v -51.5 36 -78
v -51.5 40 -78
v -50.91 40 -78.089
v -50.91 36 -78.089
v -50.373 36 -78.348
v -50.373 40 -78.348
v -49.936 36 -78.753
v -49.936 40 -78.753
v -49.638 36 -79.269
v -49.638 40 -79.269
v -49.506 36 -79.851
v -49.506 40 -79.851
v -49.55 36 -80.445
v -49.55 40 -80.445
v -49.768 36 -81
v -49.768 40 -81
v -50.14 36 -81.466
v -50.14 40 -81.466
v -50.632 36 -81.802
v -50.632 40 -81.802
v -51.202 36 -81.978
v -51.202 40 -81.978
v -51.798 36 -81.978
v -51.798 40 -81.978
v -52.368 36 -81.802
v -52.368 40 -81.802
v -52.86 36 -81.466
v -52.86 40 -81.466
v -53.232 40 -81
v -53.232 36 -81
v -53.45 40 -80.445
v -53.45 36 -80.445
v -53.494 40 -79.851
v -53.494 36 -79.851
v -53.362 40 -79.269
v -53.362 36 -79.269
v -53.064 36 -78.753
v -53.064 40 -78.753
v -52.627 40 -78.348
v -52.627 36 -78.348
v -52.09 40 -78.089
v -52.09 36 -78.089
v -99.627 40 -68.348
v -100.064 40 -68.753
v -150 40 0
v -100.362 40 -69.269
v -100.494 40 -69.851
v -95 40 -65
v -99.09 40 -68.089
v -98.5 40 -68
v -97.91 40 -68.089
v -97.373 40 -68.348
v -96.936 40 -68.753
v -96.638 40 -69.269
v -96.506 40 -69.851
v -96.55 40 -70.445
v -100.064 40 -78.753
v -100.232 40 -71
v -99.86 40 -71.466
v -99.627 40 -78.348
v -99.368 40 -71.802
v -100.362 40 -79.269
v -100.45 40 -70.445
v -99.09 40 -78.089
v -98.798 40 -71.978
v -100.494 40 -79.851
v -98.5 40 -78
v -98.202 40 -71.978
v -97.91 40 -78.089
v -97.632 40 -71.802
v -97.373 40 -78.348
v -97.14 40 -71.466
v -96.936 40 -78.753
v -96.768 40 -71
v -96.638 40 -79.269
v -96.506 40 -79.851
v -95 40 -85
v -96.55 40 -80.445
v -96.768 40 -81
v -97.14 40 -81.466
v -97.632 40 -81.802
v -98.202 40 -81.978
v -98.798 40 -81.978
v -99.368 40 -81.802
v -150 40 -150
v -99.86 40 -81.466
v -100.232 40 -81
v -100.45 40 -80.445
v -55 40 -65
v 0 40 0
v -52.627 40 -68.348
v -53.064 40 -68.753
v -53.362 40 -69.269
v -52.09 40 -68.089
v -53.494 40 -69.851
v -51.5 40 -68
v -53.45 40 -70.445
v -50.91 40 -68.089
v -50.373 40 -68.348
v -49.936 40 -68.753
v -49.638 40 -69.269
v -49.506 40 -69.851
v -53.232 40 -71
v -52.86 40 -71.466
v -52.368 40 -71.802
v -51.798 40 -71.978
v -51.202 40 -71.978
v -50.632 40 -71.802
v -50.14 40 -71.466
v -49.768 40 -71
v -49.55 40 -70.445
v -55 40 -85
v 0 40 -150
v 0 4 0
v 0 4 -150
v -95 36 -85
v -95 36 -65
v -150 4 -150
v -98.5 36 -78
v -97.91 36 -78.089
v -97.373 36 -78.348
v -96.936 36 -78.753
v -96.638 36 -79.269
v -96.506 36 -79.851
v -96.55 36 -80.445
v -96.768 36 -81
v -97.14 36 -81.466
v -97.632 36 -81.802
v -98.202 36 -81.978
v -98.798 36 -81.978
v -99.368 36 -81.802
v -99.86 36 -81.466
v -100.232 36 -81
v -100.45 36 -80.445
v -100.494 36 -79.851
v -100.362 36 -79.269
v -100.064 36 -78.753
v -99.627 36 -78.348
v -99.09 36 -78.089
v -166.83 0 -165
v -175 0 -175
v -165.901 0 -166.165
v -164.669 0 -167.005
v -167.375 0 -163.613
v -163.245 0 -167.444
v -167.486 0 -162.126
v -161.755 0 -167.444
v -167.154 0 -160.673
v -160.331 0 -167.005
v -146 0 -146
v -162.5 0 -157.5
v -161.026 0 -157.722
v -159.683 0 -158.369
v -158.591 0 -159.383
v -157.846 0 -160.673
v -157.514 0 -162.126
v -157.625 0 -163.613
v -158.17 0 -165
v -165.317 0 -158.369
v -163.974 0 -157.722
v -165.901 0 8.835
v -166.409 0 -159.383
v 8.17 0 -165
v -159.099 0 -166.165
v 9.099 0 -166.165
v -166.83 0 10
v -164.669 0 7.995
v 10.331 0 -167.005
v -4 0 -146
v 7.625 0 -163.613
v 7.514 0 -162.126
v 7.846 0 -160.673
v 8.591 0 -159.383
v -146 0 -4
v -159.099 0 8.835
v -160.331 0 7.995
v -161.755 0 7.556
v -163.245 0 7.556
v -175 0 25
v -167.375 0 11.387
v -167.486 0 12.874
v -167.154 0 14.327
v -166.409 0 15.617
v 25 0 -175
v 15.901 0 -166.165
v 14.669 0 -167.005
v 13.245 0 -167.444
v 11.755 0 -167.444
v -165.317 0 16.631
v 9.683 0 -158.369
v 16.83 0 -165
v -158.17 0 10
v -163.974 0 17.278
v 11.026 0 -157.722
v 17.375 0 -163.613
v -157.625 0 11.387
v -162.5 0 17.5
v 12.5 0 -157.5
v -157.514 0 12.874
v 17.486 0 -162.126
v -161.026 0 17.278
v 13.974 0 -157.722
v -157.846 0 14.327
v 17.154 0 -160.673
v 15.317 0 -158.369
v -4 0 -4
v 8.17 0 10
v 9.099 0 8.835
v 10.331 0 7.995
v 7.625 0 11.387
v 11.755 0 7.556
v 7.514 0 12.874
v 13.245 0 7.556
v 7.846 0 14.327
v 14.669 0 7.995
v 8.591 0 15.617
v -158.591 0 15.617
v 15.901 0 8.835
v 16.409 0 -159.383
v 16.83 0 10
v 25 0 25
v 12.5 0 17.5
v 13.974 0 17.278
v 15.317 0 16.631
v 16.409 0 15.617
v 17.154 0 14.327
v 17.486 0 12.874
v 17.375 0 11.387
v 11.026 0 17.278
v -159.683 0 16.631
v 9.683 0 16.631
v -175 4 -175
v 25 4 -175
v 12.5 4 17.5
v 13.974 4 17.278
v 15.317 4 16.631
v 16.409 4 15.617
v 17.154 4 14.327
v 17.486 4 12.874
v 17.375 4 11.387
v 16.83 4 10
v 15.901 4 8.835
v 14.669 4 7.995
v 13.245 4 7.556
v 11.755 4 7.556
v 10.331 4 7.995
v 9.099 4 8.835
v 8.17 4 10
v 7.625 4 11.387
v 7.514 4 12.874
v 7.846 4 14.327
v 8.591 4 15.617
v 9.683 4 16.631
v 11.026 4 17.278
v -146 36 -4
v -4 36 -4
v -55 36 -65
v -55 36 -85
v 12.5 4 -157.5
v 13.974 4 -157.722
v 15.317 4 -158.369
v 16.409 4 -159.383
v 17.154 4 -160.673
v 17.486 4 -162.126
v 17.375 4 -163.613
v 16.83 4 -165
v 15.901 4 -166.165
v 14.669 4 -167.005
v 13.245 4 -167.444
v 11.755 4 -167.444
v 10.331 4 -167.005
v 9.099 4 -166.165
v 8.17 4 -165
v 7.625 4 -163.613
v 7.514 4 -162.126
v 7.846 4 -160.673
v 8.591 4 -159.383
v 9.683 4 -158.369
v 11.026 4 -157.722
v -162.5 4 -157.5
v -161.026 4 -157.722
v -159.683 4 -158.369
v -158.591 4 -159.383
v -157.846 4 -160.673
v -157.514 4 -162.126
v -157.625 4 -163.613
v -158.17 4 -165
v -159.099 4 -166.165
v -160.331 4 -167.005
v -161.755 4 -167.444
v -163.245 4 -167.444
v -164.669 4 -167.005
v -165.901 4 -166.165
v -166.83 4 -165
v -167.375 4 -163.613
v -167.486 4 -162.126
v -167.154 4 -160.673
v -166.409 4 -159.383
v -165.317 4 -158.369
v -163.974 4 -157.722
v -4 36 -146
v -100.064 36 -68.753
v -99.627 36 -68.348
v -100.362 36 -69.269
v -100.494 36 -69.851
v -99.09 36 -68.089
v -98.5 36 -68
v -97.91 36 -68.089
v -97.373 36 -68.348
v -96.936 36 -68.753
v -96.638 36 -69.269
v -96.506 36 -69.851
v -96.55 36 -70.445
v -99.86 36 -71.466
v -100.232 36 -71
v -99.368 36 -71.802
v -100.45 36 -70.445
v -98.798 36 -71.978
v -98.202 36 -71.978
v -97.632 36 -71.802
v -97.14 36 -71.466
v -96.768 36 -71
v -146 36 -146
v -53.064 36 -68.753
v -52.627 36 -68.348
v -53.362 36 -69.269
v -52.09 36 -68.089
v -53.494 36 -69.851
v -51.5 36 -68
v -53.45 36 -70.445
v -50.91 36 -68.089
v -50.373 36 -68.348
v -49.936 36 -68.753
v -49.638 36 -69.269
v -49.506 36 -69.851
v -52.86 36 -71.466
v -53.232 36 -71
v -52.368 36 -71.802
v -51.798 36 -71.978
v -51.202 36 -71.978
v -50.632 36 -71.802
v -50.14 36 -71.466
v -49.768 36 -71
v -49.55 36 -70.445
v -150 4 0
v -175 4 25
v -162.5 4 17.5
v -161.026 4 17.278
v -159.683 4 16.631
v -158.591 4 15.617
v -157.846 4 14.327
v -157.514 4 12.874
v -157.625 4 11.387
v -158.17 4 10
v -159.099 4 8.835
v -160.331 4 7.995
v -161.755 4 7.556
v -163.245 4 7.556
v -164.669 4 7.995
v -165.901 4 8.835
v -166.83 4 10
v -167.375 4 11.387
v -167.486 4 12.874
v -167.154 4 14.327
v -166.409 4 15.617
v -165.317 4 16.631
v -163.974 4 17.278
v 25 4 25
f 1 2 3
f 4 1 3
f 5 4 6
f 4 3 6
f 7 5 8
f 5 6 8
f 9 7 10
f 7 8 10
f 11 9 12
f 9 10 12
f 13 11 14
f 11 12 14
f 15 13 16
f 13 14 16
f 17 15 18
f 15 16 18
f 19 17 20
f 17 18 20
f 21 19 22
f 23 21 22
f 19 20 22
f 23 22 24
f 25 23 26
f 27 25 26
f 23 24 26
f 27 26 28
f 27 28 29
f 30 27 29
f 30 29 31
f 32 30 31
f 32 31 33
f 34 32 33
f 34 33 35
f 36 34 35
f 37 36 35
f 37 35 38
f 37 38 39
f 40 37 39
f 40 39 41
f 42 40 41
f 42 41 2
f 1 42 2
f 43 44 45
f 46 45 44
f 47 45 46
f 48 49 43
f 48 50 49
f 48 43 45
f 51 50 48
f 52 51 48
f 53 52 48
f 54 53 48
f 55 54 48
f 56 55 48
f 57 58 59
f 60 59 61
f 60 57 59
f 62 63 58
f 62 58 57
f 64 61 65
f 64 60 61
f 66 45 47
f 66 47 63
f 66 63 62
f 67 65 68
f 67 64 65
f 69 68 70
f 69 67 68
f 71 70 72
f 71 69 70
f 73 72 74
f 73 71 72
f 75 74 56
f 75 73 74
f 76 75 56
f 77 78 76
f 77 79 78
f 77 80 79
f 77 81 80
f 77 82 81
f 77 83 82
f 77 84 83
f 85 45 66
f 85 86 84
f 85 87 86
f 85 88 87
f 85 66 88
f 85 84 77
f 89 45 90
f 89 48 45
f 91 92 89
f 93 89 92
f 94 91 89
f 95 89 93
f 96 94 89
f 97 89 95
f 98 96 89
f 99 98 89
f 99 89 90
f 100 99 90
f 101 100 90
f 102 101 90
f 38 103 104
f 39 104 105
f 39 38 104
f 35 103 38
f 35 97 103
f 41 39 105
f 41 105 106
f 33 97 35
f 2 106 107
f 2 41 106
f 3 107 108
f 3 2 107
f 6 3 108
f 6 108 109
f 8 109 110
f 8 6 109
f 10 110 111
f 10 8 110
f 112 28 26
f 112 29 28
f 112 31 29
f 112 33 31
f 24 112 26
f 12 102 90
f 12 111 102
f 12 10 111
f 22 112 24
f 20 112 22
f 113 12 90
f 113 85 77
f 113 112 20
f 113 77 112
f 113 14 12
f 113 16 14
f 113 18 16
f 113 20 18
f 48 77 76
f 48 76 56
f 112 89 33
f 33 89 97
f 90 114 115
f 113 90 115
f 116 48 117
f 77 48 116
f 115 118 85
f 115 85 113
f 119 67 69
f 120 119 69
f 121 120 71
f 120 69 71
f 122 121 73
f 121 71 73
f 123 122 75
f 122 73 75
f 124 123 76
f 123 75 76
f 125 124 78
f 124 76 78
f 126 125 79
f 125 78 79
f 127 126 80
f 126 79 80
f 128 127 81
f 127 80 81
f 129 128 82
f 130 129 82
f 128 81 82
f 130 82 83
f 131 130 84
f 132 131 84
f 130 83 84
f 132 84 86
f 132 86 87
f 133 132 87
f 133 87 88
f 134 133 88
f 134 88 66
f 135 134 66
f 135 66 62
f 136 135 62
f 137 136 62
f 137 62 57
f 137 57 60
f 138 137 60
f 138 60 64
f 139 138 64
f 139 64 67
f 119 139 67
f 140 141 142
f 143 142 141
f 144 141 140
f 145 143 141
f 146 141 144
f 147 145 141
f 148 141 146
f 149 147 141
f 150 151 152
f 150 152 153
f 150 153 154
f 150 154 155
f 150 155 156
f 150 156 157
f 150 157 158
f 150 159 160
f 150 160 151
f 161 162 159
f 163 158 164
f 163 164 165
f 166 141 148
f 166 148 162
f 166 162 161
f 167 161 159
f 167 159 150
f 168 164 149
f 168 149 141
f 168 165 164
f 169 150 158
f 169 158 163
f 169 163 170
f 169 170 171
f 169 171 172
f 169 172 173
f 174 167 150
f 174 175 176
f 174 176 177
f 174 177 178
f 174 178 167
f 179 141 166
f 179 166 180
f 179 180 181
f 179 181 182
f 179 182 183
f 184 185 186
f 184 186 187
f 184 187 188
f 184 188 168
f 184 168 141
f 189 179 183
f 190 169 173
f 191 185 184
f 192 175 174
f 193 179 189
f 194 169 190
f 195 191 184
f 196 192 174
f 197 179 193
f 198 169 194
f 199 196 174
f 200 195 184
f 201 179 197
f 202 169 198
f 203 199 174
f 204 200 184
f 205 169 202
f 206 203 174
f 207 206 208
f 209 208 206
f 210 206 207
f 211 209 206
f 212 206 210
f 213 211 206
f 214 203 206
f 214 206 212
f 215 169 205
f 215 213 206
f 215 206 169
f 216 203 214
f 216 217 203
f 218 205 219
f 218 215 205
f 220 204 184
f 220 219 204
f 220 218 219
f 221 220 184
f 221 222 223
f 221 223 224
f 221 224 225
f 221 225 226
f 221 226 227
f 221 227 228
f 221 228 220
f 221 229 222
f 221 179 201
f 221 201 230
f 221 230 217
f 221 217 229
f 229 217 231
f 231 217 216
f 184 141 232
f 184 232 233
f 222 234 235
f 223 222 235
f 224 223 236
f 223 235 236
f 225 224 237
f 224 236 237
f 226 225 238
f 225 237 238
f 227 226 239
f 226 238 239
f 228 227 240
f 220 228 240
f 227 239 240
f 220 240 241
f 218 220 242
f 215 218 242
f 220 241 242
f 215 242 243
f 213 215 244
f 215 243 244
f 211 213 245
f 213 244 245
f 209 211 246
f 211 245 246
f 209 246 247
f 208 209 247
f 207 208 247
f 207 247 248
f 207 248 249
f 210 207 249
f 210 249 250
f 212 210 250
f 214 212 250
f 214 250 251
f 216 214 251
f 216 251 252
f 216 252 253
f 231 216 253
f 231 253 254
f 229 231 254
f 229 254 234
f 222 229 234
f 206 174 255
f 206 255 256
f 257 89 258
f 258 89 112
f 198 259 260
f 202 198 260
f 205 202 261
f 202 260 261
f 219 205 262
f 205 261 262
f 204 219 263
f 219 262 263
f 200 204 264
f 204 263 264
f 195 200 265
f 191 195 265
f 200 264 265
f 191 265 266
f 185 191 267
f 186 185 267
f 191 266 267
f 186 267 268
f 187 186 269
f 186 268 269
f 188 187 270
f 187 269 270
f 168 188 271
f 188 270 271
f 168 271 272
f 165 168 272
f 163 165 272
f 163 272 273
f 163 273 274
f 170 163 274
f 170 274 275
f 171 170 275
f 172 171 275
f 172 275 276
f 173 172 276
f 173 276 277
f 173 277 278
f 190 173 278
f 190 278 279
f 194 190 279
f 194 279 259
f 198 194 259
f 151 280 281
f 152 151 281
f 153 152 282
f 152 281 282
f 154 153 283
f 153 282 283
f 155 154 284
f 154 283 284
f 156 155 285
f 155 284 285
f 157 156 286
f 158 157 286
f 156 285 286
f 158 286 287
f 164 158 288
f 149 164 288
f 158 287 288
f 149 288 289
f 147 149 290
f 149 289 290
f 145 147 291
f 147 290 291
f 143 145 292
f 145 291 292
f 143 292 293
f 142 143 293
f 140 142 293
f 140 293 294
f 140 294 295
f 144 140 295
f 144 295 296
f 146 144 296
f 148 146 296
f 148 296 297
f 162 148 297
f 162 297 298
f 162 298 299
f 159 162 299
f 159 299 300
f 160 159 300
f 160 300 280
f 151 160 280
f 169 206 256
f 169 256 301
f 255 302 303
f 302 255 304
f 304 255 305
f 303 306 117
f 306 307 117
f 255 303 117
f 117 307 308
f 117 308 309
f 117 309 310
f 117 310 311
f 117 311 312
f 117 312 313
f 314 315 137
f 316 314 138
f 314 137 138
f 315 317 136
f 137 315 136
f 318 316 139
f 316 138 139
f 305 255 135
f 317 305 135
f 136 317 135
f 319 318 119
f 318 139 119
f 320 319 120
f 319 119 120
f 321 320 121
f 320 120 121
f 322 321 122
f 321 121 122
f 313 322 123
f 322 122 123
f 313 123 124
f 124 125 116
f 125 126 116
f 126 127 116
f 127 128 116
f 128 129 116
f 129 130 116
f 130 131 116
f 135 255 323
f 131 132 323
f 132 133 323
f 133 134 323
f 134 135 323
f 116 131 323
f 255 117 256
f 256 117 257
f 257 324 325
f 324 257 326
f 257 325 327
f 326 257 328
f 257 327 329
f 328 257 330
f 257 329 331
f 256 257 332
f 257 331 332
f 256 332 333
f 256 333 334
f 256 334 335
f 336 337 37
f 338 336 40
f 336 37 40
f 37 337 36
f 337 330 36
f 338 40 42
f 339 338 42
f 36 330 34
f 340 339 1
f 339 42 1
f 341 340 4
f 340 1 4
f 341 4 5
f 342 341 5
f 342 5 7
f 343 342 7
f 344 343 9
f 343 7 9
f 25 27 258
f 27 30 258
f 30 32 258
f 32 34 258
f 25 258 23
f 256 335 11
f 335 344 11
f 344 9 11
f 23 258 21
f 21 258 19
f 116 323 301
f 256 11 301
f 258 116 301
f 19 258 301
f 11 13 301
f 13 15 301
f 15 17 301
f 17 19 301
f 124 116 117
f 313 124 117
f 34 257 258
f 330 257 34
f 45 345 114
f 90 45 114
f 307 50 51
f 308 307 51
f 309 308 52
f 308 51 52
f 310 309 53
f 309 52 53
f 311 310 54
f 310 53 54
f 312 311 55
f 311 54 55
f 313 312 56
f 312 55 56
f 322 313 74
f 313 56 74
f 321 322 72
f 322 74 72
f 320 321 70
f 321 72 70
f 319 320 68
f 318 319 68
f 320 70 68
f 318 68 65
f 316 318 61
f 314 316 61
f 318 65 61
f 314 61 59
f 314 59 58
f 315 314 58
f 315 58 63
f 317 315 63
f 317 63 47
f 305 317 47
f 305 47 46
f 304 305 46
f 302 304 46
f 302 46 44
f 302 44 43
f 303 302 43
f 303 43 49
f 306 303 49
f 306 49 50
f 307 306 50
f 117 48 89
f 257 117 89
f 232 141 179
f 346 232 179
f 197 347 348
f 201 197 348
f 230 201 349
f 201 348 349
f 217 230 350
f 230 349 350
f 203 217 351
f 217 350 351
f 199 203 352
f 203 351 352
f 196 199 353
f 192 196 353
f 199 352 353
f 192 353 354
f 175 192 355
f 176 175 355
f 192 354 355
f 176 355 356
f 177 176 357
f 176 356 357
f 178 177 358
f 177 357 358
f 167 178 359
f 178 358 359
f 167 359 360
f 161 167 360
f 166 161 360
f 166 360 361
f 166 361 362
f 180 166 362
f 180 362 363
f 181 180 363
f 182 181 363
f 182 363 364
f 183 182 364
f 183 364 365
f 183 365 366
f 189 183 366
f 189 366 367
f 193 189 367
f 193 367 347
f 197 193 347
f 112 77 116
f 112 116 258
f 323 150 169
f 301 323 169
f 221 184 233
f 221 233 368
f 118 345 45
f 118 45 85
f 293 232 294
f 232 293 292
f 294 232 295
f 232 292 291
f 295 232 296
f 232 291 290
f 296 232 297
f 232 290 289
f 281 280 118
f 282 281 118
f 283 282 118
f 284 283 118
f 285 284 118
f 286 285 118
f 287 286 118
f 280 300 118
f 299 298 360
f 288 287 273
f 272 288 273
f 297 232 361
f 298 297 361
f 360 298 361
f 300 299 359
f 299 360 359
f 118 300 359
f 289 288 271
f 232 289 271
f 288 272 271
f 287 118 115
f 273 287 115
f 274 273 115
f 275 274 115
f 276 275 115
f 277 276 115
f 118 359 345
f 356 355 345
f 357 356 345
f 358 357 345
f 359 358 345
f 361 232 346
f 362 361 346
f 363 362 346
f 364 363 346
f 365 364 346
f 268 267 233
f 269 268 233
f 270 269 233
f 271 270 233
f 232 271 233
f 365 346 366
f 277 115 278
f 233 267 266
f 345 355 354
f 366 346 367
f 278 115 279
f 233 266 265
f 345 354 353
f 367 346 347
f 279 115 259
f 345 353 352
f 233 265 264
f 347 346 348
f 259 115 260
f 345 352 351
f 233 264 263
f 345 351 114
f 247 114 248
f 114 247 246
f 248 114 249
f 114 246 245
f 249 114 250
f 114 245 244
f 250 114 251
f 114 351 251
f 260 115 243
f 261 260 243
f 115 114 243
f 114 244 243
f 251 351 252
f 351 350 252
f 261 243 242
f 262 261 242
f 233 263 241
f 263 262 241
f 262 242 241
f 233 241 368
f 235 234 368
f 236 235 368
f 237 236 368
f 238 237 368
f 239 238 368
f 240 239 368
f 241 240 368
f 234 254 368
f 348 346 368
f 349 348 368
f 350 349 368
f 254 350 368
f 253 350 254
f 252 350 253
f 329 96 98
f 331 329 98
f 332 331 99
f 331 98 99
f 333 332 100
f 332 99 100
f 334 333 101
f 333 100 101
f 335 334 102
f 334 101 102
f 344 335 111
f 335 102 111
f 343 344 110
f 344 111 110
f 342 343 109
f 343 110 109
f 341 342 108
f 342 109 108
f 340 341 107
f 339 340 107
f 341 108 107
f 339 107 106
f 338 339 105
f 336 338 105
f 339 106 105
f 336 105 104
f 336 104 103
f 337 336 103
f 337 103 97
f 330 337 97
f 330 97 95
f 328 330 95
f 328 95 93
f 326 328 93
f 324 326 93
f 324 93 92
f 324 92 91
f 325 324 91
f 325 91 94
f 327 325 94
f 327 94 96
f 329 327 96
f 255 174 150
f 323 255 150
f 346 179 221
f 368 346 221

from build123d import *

# Parameters (mm, degrees)
IZIM1_W                     = 150
IZIM1_H                     = 150
Y_KSEKLIK_EKSTR_ZYON1_DEPTH = 40
BO_ALTMA1_T                 = -4
IZIM2_W                     = 200
IZIM2_H                     = 200
IZIM2_W_2                   = 150
IZIM2_H_2                   = 150
Y_KSEKLIK_EKSTR_ZYON2_DEPTH = 4
KES_EKSTR_ZYON1_REACH       = 252.092
IZIM3_R                     = 5
KES_EKSTR_ZYON2_REACH       = 252.699
IZIM4_R                     = 2
IZIM4_W                     = 40
IZIM4_H                     = 20


with BuildPart() as part:
    # Çizim1 → Yükseklik-Ekstrüzyon1 (new body)
    with BuildSketch(Plane(origin=(0, 0, 0), x_dir=(1, 0, 0), z_dir=(0, 1, 0))):
        with Locations((-75, 75)):
            Rectangle(IZIM1_W, IZIM1_H)
    extrude(amount=Y_KSEKLIK_EKSTR_ZYON1_DEPTH)

    # İç Boşaltma1
    bo_altma1_openings = [part.faces().sort_by_distance(p)[0] for p in [
        (-75, 0, -75),
    ]]
    offset(amount=BO_ALTMA1_T, openings=bo_altma1_openings, kind=Kind.INTERSECTION)

    # Çizim2 → Yükseklik-Ekstrüzyon2 (add)
    with BuildSketch(Plane.XZ):
        with Locations((-75, -75)):
            Rectangle(IZIM2_W, IZIM2_H)
        with Locations((-75, -75)):
            Rectangle(IZIM2_W_2, IZIM2_H_2, mode=Mode.SUBTRACT)
    extrude(amount=-Y_KSEKLIK_EKSTR_ZYON2_DEPTH)

    # Çizim3 → Kes-Ekstrüzyon1 (cut, up to next)
    with BuildSketch(Plane(origin=(0, 4, 0), x_dir=(1, 0, 0), z_dir=(0, 1, 0)), mode=Mode.PRIVATE) as kes_ekstr_zyon1_sk1:
        with Locations(Location((12.5, 162.5, 0), (0, 0, 270))):
            Circle(IZIM3_R)
    kes_ekstr_zyon1_tool1 = extrude(kes_ekstr_zyon1_sk1.sketch, amount=-KES_EKSTR_ZYON1_REACH, mode=Mode.PRIVATE) & part.part
    # Çizim3 → Kes-Ekstrüzyon1 (cut, up to next)
    with BuildSketch(Plane(origin=(0, 4, 0), x_dir=(1, 0, 0), z_dir=(0, 1, 0)), mode=Mode.PRIVATE) as kes_ekstr_zyon1_sk2:
        with Locations(Location((12.5, -12.5, 0), (0, 0, 270))):
            Circle(IZIM3_R)
    kes_ekstr_zyon1_tool2 = extrude(kes_ekstr_zyon1_sk2.sketch, amount=-KES_EKSTR_ZYON1_REACH, mode=Mode.PRIVATE) & part.part
    # Çizim3 → Kes-Ekstrüzyon1 (cut, up to next)
    with BuildSketch(Plane(origin=(0, 4, 0), x_dir=(1, 0, 0), z_dir=(0, 1, 0)), mode=Mode.PRIVATE) as kes_ekstr_zyon1_sk3:
        with Locations(Location((-162.5, -12.5, 0), (0, 0, 270))):
            Circle(IZIM3_R)
    kes_ekstr_zyon1_tool3 = extrude(kes_ekstr_zyon1_sk3.sketch, amount=-KES_EKSTR_ZYON1_REACH, mode=Mode.PRIVATE) & part.part
    # Çizim3 → Kes-Ekstrüzyon1 (cut, up to next)
    with BuildSketch(Plane(origin=(0, 4, 0), x_dir=(1, 0, 0), z_dir=(0, 1, 0)), mode=Mode.PRIVATE) as kes_ekstr_zyon1_sk4:
        with Locations(Location((-162.5, 162.5, 0), (0, 0, 270))):
            Circle(IZIM3_R)
    kes_ekstr_zyon1_tool4 = extrude(kes_ekstr_zyon1_sk4.sketch, amount=-KES_EKSTR_ZYON1_REACH, mode=Mode.PRIVATE) & part.part
    add(kes_ekstr_zyon1_tool1.solids().sort_by_distance((12.5, 4, -162.5))[0], mode=Mode.SUBTRACT)
    add(kes_ekstr_zyon1_tool2.solids().sort_by_distance((12.5, 4, 12.5))[0], mode=Mode.SUBTRACT)
    add(kes_ekstr_zyon1_tool3.solids().sort_by_distance((-162.5, 4, 12.5))[0], mode=Mode.SUBTRACT)
    add(kes_ekstr_zyon1_tool4.solids().sort_by_distance((-162.5, 4, -162.5))[0], mode=Mode.SUBTRACT)

    # Çizim4 → Kes-Ekstrüzyon2 (cut, up to next)
    with BuildSketch(Plane(origin=(0, 40, 0), x_dir=(1, 0, 0), z_dir=(0, 1, 0)), mode=Mode.PRIVATE) as kes_ekstr_zyon2_sk1:
        with Locations(Location((-51.5, 70, 0), (0, 0, 270))):
            Circle(IZIM4_R)
    kes_ekstr_zyon2_tool1 = extrude(kes_ekstr_zyon2_sk1.sketch, amount=-KES_EKSTR_ZYON2_REACH, mode=Mode.PRIVATE) & part.part
    # Çizim4 → Kes-Ekstrüzyon2 (cut, up to next)
    with BuildSketch(Plane(origin=(0, 40, 0), x_dir=(1, 0, 0), z_dir=(0, 1, 0)), mode=Mode.PRIVATE) as kes_ekstr_zyon2_sk2:
        with Locations(Location((-51.5, 80, 0), (0, 0, 270))):
            Circle(IZIM4_R)
    kes_ekstr_zyon2_tool2 = extrude(kes_ekstr_zyon2_sk2.sketch, amount=-KES_EKSTR_ZYON2_REACH, mode=Mode.PRIVATE) & part.part
    # Çizim4 → Kes-Ekstrüzyon2 (cut, up to next)
    with BuildSketch(Plane(origin=(0, 40, 0), x_dir=(1, 0, 0), z_dir=(0, 1, 0)), mode=Mode.PRIVATE) as kes_ekstr_zyon2_sk3:
        with Locations(Location((-98.5, 80, 0), (0, 0, 270))):
            Circle(IZIM4_R)
    kes_ekstr_zyon2_tool3 = extrude(kes_ekstr_zyon2_sk3.sketch, amount=-KES_EKSTR_ZYON2_REACH, mode=Mode.PRIVATE) & part.part
    # Çizim4 → Kes-Ekstrüzyon2 (cut, up to next)
    with BuildSketch(Plane(origin=(0, 40, 0), x_dir=(1, 0, 0), z_dir=(0, 1, 0)), mode=Mode.PRIVATE) as kes_ekstr_zyon2_sk4:
        with Locations(Location((-98.5, 70, 0), (0, 0, 270))):
            Circle(IZIM4_R)
    kes_ekstr_zyon2_tool4 = extrude(kes_ekstr_zyon2_sk4.sketch, amount=-KES_EKSTR_ZYON2_REACH, mode=Mode.PRIVATE) & part.part
    # Çizim4 → Kes-Ekstrüzyon2 (cut, up to next)
    with BuildSketch(Plane(origin=(0, 40, 0), x_dir=(1, 0, 0), z_dir=(0, 1, 0)), mode=Mode.PRIVATE) as kes_ekstr_zyon2_sk5:
        with Locations((-75, 75)):
            Rectangle(IZIM4_W, IZIM4_H)
    kes_ekstr_zyon2_tool5 = extrude(kes_ekstr_zyon2_sk5.sketch, amount=-KES_EKSTR_ZYON2_REACH, mode=Mode.PRIVATE) & part.part
    add(kes_ekstr_zyon2_tool1.solids().sort_by_distance((-51.5, 40, -70))[0], mode=Mode.SUBTRACT)
    add(kes_ekstr_zyon2_tool2.solids().sort_by_distance((-51.5, 40, -80))[0], mode=Mode.SUBTRACT)
    add(kes_ekstr_zyon2_tool3.solids().sort_by_distance((-98.5, 40, -80))[0], mode=Mode.SUBTRACT)
    add(kes_ekstr_zyon2_tool4.solids().sort_by_distance((-98.5, 40, -70))[0], mode=Mode.SUBTRACT)
    add(kes_ekstr_zyon2_tool5.solids().sort_by_distance((-75, 40, -75))[0], mode=Mode.SUBTRACT)


solid = part.part
